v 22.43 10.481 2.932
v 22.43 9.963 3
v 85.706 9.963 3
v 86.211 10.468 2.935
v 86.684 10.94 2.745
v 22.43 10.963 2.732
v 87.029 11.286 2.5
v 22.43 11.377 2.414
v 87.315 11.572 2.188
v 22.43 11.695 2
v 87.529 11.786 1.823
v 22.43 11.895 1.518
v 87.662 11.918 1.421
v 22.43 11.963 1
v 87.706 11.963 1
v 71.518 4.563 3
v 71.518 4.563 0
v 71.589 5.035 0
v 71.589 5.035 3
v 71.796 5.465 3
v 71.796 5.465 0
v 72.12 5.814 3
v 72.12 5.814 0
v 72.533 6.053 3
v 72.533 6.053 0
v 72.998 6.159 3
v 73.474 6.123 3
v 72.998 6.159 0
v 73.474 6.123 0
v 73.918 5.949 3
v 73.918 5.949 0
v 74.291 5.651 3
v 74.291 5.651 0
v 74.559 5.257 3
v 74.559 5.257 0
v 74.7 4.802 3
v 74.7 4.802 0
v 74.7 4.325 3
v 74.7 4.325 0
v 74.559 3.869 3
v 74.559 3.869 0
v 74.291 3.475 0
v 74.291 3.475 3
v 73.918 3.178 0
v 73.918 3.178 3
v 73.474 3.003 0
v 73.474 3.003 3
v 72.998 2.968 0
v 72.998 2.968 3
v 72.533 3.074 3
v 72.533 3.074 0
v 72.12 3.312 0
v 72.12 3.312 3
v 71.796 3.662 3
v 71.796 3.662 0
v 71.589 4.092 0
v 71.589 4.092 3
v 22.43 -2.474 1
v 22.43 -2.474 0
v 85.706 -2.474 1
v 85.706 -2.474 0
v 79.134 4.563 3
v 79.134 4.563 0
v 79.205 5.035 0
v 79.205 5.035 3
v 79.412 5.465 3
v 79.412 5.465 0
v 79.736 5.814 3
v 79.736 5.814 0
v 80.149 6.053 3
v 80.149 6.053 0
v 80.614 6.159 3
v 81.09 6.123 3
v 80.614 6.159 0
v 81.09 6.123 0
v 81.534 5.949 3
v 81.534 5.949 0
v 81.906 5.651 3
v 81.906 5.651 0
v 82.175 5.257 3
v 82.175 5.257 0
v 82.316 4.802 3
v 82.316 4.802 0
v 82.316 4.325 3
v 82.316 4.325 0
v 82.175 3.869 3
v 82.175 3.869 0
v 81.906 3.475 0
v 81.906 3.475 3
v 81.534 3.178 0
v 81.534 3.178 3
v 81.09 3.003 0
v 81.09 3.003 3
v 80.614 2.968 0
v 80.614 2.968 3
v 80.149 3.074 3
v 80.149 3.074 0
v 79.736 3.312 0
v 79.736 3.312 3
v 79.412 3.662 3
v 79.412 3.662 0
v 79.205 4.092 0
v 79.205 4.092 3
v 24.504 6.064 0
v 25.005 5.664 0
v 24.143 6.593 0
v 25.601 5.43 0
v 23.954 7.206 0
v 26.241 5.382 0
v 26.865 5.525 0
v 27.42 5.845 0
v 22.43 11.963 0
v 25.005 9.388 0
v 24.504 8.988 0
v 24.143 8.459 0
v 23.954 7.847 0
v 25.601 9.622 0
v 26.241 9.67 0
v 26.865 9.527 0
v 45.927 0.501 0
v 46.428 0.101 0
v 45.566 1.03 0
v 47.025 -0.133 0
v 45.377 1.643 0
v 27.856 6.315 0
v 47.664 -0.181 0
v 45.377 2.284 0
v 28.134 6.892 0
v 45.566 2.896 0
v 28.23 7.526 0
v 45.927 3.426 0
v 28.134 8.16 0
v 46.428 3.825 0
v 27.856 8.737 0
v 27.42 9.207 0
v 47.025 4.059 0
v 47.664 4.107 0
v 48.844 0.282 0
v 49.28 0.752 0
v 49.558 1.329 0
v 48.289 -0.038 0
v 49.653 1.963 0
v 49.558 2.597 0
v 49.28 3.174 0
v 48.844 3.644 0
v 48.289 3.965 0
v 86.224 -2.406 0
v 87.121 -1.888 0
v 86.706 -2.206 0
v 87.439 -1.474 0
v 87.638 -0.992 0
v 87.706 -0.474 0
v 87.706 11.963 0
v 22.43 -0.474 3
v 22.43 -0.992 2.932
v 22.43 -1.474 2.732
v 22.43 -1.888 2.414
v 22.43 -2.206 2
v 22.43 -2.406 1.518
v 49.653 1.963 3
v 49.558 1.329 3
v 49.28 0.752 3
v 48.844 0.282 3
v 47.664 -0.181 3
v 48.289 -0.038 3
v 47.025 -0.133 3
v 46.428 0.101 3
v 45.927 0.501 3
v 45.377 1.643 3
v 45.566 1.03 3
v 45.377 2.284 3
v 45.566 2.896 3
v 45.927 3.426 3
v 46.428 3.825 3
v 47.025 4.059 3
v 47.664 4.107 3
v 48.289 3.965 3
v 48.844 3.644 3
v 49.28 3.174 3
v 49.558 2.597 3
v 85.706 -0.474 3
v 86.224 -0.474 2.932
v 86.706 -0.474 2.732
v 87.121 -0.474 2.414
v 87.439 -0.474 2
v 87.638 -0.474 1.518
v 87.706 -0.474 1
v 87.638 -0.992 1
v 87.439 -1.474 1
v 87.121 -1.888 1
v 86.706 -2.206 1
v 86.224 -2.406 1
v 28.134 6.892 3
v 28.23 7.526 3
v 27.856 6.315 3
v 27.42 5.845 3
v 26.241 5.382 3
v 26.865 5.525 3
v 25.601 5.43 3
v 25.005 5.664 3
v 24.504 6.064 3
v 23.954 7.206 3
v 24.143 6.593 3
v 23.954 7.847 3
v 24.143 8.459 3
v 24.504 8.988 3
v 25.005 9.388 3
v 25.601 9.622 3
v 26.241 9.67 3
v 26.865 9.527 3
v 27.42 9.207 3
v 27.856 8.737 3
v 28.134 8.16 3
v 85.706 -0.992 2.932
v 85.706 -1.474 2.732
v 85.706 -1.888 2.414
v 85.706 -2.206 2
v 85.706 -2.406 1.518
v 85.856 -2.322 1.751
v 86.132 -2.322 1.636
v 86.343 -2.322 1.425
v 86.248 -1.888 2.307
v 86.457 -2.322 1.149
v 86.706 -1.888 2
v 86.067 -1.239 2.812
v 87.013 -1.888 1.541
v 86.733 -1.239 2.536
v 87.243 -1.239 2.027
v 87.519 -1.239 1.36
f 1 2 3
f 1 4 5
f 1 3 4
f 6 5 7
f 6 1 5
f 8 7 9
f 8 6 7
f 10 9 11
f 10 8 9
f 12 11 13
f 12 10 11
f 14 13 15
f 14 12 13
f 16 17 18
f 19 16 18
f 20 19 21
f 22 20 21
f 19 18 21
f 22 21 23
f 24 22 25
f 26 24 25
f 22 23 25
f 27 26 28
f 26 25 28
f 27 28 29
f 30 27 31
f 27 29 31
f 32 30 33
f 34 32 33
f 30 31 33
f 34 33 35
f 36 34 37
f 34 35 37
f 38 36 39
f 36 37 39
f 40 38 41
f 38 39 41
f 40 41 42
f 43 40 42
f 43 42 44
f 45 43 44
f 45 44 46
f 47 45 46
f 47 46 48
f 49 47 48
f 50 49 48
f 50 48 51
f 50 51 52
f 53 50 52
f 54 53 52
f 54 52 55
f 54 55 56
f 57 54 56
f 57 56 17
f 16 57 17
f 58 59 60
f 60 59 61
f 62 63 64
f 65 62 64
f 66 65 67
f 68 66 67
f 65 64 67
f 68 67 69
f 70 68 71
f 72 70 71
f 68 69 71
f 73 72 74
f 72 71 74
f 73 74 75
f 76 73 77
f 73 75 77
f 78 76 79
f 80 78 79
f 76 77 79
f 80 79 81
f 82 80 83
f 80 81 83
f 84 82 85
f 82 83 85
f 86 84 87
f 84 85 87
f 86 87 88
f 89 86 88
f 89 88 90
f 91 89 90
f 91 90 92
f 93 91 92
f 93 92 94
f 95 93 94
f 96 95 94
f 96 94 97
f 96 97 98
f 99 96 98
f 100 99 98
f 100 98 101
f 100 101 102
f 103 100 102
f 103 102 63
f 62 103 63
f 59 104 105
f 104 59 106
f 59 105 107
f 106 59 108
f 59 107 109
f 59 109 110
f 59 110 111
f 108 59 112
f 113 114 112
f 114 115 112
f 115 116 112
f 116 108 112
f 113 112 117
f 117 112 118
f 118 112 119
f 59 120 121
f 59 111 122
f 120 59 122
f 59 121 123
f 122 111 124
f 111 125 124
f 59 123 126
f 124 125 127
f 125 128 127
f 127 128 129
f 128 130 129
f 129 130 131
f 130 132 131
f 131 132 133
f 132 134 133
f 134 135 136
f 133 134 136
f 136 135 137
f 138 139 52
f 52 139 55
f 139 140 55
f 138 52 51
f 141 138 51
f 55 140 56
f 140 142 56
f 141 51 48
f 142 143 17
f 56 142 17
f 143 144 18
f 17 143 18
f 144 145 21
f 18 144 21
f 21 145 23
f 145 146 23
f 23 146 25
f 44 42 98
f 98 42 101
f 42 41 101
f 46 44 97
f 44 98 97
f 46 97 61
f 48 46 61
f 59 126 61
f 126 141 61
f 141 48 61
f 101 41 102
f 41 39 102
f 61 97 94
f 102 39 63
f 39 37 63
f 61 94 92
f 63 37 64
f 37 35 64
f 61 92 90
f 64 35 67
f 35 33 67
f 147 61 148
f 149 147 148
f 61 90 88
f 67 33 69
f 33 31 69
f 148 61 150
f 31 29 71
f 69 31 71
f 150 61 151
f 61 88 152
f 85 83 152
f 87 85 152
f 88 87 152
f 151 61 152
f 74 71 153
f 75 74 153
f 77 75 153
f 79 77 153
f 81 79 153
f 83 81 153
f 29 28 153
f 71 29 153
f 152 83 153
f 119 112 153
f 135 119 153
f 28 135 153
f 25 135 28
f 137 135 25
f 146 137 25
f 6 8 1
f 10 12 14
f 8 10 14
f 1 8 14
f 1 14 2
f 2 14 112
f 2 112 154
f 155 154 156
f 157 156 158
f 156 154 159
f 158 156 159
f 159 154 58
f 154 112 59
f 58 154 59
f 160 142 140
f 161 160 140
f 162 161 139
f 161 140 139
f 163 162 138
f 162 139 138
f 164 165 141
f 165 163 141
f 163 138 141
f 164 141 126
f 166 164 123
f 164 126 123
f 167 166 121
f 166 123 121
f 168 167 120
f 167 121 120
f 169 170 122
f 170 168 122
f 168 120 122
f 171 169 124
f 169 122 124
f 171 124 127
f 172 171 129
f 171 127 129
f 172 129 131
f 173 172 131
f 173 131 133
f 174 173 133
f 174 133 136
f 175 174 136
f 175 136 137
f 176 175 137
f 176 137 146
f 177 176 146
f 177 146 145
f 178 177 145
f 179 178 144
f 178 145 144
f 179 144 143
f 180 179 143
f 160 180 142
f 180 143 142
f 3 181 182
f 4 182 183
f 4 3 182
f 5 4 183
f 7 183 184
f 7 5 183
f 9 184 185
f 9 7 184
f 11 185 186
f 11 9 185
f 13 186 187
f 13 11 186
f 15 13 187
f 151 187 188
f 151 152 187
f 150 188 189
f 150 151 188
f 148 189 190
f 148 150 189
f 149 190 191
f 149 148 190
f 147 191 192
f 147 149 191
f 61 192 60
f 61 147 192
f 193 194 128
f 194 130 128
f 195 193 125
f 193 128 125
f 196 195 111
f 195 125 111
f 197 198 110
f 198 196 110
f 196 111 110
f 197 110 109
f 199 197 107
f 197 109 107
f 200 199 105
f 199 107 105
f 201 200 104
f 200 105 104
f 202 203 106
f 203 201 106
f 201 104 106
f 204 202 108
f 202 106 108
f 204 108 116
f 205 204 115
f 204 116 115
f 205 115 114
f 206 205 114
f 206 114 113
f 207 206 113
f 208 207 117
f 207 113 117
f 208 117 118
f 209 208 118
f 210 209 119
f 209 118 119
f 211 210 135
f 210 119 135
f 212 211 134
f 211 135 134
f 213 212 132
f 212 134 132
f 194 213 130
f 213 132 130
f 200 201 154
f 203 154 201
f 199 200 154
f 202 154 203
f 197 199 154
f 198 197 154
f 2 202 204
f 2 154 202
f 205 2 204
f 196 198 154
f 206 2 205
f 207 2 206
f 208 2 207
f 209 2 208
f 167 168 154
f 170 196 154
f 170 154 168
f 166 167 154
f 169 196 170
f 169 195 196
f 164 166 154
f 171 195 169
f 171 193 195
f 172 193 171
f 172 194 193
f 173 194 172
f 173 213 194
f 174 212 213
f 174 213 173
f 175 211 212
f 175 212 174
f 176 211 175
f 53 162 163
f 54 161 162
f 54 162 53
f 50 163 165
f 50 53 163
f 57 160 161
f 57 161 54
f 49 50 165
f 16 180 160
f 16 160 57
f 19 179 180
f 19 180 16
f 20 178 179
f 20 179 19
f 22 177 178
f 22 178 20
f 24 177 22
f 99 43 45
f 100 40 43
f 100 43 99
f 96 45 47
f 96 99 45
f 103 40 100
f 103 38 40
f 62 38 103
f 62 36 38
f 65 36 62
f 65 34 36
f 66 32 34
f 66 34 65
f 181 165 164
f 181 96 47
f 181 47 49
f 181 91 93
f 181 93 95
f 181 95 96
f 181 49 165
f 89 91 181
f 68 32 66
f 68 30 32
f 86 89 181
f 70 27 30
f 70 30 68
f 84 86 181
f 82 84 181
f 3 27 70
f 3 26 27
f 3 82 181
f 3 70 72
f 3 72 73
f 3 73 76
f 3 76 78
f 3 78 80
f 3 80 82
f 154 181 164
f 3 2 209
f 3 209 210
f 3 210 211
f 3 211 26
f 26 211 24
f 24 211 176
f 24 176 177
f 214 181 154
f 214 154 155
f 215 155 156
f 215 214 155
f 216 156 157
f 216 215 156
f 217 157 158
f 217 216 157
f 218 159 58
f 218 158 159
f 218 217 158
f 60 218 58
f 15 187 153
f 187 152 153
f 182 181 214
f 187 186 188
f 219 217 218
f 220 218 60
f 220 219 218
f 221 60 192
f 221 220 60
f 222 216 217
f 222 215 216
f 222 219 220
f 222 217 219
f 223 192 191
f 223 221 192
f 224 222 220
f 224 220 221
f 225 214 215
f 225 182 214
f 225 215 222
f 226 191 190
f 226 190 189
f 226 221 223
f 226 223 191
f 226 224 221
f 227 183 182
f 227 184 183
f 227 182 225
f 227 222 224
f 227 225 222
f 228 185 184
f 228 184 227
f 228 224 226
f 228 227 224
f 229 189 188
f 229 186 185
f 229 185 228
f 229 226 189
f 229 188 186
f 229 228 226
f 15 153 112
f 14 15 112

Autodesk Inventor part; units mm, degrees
ref_plane "YZ Plane" through (0, 0, 0) normal (1, 0, 0) x (0, 1, 0)
ref_plane "XZ Plane" through (0, 0, 0) normal (0, 1, 0) x (-1, 0, 0)
ref_plane "XY Plane" through (0, 0, 0) normal (0, 0, 1) x (1, 0, 0)
sketch "Skizze1" plane through (0, 0, 0) normal (0, 0, 1) x (1, 0, 0)
  line L0 (-4.2593, -15) -> (-4.2593, 15) construction
  line L1 (-4.2593, -15) -> (4.6613, -15) construction
  arc A0 (71.1407, -18.3849) -> (4.6613, -15) centre (32.8959, -114.9901) ccw construction
  line L2 (71.1407, -12.6613) -> (71.1407, -18.3849) construction
  line L3 (72.2593, -12.6613) -> (71.1407, -12.6613) construction
  line L4 (72.2593, -19) -> (72.2593, -12.6613) construction
  line L5 (75.2593, -19) -> (72.2593, -19) construction
  line L6 (75.2593, -9.9704) -> (75.2593, -19) construction
  arc A1 (75.2593, -9.9704) -> (13.1677, 13.0021) centre (8.1722, -95.8991) ccw construction
  arc A2 (11.2593, 15) -> (13.1677, 13.0021) centre (13.2593, 15) ccw construction
  line L7 (11.2593, 15) -> (-4.2593, 15) construction
  arc A3 (7.8907, 11.0161) -> (3.5907, 11.0161) centre (5.7407, 11.0161) ccw construction
  line L8 (7.8907, 6.0161) -> (7.8907, 11.0161) construction
  arc A4 (3.5907, 6.0161) -> (7.8907, 6.0161) centre (5.7407, 6.0161) ccw construction
  line L9 (3.5907, 11.0161) -> (3.5907, 6.0161) construction
  line L10 (7.8907, -10.5786) -> (7.8907, -5.5786) construction
  arc A5 (3.5907, -10.5786) -> (7.8907, -10.5786) centre (5.7407, -10.5786) ccw construction
  line L11 (3.5907, -5.5786) -> (3.5907, -10.5786) construction
  arc A6 (7.8907, -5.5786) -> (3.5907, -5.5786) centre (5.7407, -5.5786) ccw construction
  arc A7 (77.2593, -11.57) -> (68.4849, -5.0872) centre (8.1722, -95.8991) ccw construction
  arc A8 (68.4849, -5.0872) -> (68.1407, -6.2089) centre (70.1407, -6.2089) ccw construction
  line L12 (68.1407, -19.3793) -> (68.1407, -6.2089) construction
  arc A9 (71.1407, -20.5393) -> (68.1407, -19.3793) centre (32.8959, -114.9901) ccw construction
  line L13 (71.1407, -13) -> (71.1407, -20.5393) construction
  line L14 (73.1277, -13) -> (71.1407, -13) construction
  line L15 (73.1277, -21) -> (73.1277, -13) construction
  line L16 (77.2593, -21) -> (73.1277, -21) construction
  line L17 (77.2593, -11.57) -> (77.2593, -21) construction
  arc A10 (67.1407, -2.4739) -> (65.1407, -4.4739) centre (67.1407, -4.4739) ccw construction
  line L18 (67.1407, -2.4739) -> (68.1407, -2.4739) construction
  line L19 (68.1407, -2.4739) -> (68.1407, -14.8476) construction
  line L20 (22.4305, -2.4739) -> (87.7065, -2.4739)
  line L21 (87.7065, -2.4739) -> (87.7065, 11.9632)
  line L22 (87.7065, 11.9632) -> (22.4305, 11.9632)
  line L23 (22.4305, 11.9632) -> (22.4305, -2.4739)
  line L24 (26.0799, -2.4739) -> (26.0799, 7.5261) construction
  line L25 (47.5033, 11.9632) -> (47.5033, 1.9632) construction
  circle A11 centre (26.0799, 7.5261) radius 2.15
  circle A12 centre (47.5033, 1.9632) radius 2.15
  point P0 (0, 0)
  dimension "d0" = 10
  dimension "d1" = 10
  dimension "d2" = 4.3
  dimension "d3" = 4.3
extrude "Extrusion1" add sketch "Skizze1" along normal blind 3
sketch "Skizze2" plane through (0, 0, 0) normal (0, 0, -1) x (-1, 0, 0)
  arc A0 (-72.5805, 2.9132) -> (-72.5805, 6.2132) centre (-72.5805, 4.5632) ccw construction
  arc A1 (-73.5805, 6.2132) -> (-73.5805, 2.9132) centre (-73.5805, 4.5632) ccw construction
  arc A2 (-80.2805, 2.9132) -> (-80.2805, 6.2132) centre (-80.2805, 4.5632) ccw construction
  arc A3 (-81.2805, 6.2132) -> (-81.2805, 2.9132) centre (-81.2805, 4.5632) ccw construction
  circle A4 centre (-73.1179, 4.5632) radius 1.6
  circle A5 centre (-80.7335, 4.5632) radius 1.6
  point P0 (0, 0)
  dimension "d6" = 3.2
  dimension "d7" = 3.2
extrude "Extrusion2" cut sketch "Skizze2" against normal through all
fillet "Rundung1" radius 2 2 edges at (55.0685, 11.9632, 3) (87.7065, 4.7446, 3)
fillet "Rundung2" radius 2 3 edges at (87.1208, -2.4739, 2.4142) (87.7065, -2.4739, 0.5) (54.0685, -2.4739, 3)
properties part number "Chain_drag"
